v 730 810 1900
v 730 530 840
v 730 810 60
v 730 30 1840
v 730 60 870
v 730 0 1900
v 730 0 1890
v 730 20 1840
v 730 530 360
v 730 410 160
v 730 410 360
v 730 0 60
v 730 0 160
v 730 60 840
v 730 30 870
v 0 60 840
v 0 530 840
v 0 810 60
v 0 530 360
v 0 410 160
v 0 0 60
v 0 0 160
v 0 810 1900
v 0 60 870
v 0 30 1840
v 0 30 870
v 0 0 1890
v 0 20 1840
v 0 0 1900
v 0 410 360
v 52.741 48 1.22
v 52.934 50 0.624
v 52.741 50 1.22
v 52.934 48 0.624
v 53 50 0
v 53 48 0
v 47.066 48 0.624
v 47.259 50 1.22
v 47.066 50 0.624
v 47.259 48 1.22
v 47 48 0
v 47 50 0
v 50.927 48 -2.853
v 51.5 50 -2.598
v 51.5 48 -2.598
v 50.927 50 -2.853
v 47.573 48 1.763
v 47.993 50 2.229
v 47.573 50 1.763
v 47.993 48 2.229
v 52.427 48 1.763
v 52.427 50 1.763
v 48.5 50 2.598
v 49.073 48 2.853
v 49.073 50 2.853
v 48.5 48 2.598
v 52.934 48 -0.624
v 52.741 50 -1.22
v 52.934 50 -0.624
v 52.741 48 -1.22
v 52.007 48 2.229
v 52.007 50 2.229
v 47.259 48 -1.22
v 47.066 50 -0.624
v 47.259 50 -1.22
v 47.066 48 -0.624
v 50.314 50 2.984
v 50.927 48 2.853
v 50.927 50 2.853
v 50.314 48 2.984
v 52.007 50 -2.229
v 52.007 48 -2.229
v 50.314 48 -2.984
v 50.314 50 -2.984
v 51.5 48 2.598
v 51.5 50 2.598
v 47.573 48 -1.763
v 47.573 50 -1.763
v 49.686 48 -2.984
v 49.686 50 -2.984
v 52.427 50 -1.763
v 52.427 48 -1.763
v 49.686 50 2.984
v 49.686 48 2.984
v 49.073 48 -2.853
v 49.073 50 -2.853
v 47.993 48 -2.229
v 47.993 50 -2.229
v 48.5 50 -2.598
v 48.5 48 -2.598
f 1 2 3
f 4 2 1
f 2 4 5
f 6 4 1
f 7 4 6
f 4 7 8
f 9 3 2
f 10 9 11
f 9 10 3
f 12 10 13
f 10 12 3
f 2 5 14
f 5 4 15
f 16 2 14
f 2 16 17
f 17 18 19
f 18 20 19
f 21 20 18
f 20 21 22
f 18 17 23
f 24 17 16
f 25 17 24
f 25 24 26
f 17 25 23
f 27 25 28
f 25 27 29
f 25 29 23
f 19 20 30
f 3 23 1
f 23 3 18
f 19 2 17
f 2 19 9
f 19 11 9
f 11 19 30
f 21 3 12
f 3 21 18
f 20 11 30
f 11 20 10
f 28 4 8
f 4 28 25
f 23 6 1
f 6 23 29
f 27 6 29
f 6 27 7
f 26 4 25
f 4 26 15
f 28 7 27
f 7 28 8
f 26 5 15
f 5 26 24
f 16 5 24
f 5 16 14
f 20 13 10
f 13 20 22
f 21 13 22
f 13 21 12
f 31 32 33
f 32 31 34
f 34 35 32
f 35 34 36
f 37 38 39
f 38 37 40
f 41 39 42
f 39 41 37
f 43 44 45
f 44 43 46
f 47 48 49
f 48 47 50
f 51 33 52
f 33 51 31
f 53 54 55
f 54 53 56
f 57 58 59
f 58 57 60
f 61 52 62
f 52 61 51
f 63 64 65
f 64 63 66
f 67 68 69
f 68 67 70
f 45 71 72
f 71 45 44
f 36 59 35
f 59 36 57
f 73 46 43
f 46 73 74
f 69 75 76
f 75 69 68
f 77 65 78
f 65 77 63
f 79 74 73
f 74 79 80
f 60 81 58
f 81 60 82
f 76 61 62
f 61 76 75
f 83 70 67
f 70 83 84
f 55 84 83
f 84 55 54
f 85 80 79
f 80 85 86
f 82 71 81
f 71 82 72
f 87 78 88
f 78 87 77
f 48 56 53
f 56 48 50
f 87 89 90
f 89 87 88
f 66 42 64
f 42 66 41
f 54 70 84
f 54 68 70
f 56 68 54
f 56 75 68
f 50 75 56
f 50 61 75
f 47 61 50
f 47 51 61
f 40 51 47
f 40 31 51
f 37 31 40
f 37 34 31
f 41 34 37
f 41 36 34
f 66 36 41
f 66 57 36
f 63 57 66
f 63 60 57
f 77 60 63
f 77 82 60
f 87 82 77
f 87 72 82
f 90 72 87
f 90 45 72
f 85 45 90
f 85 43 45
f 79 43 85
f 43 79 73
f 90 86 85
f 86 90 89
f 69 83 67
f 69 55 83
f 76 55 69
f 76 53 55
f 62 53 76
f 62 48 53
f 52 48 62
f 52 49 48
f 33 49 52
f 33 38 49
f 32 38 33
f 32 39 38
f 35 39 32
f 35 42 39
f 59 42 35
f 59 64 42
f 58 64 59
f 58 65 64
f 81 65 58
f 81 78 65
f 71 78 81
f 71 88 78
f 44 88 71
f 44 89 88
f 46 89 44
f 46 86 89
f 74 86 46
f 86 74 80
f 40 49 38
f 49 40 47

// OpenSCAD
//
//
//Tayler Frozen food dispenser R280
//https://www.taylor-company.com/wp-content/uploads/2023/04/Taylor_R280_FrozenFoodDispenser_Manual_1.pdf
//
//
R280_body();
module R280_body(){
//    cube([730, 810, 1900]);
    translate([0,0,1900-60])
    color("black")
    hull(){
        translate([0,0,50]) cube([730, 30, 10]);
        translate([0,20,0])    cube([730, 10, 30]);
    }
    color("silver")    translate([0,30,1900-60])cube([730, 810-30, 60]);
    color("silver")translate([0,30,1900-60-1000+30])cube([730, 30, 1000-30]);
    color("silver")translate([0,30+30,1900-60-1000])cube([730, 810-60, 1000]);
    color("silver")
    union(){
    translate([0,810-280,60+100])cube([730, 280, 680]);
    translate([0,810-400,60])cube([730, 400, 300]);
    }
    color("gray")translate([0,0,60])cube([730, 810, 100]);
    $fs=0.1;
translate([50, 50, 0])rotate([90,0,0])cylinder(h=2, r=3);

}
/*
$fs=0.1;
translate([50, 50, 0])rotate([90,0,0])cylinder(h=2, r=3);
translate([(810-70), 50, 0])rotate([90,0,0])cylinder(h=2, r=3);

*/
